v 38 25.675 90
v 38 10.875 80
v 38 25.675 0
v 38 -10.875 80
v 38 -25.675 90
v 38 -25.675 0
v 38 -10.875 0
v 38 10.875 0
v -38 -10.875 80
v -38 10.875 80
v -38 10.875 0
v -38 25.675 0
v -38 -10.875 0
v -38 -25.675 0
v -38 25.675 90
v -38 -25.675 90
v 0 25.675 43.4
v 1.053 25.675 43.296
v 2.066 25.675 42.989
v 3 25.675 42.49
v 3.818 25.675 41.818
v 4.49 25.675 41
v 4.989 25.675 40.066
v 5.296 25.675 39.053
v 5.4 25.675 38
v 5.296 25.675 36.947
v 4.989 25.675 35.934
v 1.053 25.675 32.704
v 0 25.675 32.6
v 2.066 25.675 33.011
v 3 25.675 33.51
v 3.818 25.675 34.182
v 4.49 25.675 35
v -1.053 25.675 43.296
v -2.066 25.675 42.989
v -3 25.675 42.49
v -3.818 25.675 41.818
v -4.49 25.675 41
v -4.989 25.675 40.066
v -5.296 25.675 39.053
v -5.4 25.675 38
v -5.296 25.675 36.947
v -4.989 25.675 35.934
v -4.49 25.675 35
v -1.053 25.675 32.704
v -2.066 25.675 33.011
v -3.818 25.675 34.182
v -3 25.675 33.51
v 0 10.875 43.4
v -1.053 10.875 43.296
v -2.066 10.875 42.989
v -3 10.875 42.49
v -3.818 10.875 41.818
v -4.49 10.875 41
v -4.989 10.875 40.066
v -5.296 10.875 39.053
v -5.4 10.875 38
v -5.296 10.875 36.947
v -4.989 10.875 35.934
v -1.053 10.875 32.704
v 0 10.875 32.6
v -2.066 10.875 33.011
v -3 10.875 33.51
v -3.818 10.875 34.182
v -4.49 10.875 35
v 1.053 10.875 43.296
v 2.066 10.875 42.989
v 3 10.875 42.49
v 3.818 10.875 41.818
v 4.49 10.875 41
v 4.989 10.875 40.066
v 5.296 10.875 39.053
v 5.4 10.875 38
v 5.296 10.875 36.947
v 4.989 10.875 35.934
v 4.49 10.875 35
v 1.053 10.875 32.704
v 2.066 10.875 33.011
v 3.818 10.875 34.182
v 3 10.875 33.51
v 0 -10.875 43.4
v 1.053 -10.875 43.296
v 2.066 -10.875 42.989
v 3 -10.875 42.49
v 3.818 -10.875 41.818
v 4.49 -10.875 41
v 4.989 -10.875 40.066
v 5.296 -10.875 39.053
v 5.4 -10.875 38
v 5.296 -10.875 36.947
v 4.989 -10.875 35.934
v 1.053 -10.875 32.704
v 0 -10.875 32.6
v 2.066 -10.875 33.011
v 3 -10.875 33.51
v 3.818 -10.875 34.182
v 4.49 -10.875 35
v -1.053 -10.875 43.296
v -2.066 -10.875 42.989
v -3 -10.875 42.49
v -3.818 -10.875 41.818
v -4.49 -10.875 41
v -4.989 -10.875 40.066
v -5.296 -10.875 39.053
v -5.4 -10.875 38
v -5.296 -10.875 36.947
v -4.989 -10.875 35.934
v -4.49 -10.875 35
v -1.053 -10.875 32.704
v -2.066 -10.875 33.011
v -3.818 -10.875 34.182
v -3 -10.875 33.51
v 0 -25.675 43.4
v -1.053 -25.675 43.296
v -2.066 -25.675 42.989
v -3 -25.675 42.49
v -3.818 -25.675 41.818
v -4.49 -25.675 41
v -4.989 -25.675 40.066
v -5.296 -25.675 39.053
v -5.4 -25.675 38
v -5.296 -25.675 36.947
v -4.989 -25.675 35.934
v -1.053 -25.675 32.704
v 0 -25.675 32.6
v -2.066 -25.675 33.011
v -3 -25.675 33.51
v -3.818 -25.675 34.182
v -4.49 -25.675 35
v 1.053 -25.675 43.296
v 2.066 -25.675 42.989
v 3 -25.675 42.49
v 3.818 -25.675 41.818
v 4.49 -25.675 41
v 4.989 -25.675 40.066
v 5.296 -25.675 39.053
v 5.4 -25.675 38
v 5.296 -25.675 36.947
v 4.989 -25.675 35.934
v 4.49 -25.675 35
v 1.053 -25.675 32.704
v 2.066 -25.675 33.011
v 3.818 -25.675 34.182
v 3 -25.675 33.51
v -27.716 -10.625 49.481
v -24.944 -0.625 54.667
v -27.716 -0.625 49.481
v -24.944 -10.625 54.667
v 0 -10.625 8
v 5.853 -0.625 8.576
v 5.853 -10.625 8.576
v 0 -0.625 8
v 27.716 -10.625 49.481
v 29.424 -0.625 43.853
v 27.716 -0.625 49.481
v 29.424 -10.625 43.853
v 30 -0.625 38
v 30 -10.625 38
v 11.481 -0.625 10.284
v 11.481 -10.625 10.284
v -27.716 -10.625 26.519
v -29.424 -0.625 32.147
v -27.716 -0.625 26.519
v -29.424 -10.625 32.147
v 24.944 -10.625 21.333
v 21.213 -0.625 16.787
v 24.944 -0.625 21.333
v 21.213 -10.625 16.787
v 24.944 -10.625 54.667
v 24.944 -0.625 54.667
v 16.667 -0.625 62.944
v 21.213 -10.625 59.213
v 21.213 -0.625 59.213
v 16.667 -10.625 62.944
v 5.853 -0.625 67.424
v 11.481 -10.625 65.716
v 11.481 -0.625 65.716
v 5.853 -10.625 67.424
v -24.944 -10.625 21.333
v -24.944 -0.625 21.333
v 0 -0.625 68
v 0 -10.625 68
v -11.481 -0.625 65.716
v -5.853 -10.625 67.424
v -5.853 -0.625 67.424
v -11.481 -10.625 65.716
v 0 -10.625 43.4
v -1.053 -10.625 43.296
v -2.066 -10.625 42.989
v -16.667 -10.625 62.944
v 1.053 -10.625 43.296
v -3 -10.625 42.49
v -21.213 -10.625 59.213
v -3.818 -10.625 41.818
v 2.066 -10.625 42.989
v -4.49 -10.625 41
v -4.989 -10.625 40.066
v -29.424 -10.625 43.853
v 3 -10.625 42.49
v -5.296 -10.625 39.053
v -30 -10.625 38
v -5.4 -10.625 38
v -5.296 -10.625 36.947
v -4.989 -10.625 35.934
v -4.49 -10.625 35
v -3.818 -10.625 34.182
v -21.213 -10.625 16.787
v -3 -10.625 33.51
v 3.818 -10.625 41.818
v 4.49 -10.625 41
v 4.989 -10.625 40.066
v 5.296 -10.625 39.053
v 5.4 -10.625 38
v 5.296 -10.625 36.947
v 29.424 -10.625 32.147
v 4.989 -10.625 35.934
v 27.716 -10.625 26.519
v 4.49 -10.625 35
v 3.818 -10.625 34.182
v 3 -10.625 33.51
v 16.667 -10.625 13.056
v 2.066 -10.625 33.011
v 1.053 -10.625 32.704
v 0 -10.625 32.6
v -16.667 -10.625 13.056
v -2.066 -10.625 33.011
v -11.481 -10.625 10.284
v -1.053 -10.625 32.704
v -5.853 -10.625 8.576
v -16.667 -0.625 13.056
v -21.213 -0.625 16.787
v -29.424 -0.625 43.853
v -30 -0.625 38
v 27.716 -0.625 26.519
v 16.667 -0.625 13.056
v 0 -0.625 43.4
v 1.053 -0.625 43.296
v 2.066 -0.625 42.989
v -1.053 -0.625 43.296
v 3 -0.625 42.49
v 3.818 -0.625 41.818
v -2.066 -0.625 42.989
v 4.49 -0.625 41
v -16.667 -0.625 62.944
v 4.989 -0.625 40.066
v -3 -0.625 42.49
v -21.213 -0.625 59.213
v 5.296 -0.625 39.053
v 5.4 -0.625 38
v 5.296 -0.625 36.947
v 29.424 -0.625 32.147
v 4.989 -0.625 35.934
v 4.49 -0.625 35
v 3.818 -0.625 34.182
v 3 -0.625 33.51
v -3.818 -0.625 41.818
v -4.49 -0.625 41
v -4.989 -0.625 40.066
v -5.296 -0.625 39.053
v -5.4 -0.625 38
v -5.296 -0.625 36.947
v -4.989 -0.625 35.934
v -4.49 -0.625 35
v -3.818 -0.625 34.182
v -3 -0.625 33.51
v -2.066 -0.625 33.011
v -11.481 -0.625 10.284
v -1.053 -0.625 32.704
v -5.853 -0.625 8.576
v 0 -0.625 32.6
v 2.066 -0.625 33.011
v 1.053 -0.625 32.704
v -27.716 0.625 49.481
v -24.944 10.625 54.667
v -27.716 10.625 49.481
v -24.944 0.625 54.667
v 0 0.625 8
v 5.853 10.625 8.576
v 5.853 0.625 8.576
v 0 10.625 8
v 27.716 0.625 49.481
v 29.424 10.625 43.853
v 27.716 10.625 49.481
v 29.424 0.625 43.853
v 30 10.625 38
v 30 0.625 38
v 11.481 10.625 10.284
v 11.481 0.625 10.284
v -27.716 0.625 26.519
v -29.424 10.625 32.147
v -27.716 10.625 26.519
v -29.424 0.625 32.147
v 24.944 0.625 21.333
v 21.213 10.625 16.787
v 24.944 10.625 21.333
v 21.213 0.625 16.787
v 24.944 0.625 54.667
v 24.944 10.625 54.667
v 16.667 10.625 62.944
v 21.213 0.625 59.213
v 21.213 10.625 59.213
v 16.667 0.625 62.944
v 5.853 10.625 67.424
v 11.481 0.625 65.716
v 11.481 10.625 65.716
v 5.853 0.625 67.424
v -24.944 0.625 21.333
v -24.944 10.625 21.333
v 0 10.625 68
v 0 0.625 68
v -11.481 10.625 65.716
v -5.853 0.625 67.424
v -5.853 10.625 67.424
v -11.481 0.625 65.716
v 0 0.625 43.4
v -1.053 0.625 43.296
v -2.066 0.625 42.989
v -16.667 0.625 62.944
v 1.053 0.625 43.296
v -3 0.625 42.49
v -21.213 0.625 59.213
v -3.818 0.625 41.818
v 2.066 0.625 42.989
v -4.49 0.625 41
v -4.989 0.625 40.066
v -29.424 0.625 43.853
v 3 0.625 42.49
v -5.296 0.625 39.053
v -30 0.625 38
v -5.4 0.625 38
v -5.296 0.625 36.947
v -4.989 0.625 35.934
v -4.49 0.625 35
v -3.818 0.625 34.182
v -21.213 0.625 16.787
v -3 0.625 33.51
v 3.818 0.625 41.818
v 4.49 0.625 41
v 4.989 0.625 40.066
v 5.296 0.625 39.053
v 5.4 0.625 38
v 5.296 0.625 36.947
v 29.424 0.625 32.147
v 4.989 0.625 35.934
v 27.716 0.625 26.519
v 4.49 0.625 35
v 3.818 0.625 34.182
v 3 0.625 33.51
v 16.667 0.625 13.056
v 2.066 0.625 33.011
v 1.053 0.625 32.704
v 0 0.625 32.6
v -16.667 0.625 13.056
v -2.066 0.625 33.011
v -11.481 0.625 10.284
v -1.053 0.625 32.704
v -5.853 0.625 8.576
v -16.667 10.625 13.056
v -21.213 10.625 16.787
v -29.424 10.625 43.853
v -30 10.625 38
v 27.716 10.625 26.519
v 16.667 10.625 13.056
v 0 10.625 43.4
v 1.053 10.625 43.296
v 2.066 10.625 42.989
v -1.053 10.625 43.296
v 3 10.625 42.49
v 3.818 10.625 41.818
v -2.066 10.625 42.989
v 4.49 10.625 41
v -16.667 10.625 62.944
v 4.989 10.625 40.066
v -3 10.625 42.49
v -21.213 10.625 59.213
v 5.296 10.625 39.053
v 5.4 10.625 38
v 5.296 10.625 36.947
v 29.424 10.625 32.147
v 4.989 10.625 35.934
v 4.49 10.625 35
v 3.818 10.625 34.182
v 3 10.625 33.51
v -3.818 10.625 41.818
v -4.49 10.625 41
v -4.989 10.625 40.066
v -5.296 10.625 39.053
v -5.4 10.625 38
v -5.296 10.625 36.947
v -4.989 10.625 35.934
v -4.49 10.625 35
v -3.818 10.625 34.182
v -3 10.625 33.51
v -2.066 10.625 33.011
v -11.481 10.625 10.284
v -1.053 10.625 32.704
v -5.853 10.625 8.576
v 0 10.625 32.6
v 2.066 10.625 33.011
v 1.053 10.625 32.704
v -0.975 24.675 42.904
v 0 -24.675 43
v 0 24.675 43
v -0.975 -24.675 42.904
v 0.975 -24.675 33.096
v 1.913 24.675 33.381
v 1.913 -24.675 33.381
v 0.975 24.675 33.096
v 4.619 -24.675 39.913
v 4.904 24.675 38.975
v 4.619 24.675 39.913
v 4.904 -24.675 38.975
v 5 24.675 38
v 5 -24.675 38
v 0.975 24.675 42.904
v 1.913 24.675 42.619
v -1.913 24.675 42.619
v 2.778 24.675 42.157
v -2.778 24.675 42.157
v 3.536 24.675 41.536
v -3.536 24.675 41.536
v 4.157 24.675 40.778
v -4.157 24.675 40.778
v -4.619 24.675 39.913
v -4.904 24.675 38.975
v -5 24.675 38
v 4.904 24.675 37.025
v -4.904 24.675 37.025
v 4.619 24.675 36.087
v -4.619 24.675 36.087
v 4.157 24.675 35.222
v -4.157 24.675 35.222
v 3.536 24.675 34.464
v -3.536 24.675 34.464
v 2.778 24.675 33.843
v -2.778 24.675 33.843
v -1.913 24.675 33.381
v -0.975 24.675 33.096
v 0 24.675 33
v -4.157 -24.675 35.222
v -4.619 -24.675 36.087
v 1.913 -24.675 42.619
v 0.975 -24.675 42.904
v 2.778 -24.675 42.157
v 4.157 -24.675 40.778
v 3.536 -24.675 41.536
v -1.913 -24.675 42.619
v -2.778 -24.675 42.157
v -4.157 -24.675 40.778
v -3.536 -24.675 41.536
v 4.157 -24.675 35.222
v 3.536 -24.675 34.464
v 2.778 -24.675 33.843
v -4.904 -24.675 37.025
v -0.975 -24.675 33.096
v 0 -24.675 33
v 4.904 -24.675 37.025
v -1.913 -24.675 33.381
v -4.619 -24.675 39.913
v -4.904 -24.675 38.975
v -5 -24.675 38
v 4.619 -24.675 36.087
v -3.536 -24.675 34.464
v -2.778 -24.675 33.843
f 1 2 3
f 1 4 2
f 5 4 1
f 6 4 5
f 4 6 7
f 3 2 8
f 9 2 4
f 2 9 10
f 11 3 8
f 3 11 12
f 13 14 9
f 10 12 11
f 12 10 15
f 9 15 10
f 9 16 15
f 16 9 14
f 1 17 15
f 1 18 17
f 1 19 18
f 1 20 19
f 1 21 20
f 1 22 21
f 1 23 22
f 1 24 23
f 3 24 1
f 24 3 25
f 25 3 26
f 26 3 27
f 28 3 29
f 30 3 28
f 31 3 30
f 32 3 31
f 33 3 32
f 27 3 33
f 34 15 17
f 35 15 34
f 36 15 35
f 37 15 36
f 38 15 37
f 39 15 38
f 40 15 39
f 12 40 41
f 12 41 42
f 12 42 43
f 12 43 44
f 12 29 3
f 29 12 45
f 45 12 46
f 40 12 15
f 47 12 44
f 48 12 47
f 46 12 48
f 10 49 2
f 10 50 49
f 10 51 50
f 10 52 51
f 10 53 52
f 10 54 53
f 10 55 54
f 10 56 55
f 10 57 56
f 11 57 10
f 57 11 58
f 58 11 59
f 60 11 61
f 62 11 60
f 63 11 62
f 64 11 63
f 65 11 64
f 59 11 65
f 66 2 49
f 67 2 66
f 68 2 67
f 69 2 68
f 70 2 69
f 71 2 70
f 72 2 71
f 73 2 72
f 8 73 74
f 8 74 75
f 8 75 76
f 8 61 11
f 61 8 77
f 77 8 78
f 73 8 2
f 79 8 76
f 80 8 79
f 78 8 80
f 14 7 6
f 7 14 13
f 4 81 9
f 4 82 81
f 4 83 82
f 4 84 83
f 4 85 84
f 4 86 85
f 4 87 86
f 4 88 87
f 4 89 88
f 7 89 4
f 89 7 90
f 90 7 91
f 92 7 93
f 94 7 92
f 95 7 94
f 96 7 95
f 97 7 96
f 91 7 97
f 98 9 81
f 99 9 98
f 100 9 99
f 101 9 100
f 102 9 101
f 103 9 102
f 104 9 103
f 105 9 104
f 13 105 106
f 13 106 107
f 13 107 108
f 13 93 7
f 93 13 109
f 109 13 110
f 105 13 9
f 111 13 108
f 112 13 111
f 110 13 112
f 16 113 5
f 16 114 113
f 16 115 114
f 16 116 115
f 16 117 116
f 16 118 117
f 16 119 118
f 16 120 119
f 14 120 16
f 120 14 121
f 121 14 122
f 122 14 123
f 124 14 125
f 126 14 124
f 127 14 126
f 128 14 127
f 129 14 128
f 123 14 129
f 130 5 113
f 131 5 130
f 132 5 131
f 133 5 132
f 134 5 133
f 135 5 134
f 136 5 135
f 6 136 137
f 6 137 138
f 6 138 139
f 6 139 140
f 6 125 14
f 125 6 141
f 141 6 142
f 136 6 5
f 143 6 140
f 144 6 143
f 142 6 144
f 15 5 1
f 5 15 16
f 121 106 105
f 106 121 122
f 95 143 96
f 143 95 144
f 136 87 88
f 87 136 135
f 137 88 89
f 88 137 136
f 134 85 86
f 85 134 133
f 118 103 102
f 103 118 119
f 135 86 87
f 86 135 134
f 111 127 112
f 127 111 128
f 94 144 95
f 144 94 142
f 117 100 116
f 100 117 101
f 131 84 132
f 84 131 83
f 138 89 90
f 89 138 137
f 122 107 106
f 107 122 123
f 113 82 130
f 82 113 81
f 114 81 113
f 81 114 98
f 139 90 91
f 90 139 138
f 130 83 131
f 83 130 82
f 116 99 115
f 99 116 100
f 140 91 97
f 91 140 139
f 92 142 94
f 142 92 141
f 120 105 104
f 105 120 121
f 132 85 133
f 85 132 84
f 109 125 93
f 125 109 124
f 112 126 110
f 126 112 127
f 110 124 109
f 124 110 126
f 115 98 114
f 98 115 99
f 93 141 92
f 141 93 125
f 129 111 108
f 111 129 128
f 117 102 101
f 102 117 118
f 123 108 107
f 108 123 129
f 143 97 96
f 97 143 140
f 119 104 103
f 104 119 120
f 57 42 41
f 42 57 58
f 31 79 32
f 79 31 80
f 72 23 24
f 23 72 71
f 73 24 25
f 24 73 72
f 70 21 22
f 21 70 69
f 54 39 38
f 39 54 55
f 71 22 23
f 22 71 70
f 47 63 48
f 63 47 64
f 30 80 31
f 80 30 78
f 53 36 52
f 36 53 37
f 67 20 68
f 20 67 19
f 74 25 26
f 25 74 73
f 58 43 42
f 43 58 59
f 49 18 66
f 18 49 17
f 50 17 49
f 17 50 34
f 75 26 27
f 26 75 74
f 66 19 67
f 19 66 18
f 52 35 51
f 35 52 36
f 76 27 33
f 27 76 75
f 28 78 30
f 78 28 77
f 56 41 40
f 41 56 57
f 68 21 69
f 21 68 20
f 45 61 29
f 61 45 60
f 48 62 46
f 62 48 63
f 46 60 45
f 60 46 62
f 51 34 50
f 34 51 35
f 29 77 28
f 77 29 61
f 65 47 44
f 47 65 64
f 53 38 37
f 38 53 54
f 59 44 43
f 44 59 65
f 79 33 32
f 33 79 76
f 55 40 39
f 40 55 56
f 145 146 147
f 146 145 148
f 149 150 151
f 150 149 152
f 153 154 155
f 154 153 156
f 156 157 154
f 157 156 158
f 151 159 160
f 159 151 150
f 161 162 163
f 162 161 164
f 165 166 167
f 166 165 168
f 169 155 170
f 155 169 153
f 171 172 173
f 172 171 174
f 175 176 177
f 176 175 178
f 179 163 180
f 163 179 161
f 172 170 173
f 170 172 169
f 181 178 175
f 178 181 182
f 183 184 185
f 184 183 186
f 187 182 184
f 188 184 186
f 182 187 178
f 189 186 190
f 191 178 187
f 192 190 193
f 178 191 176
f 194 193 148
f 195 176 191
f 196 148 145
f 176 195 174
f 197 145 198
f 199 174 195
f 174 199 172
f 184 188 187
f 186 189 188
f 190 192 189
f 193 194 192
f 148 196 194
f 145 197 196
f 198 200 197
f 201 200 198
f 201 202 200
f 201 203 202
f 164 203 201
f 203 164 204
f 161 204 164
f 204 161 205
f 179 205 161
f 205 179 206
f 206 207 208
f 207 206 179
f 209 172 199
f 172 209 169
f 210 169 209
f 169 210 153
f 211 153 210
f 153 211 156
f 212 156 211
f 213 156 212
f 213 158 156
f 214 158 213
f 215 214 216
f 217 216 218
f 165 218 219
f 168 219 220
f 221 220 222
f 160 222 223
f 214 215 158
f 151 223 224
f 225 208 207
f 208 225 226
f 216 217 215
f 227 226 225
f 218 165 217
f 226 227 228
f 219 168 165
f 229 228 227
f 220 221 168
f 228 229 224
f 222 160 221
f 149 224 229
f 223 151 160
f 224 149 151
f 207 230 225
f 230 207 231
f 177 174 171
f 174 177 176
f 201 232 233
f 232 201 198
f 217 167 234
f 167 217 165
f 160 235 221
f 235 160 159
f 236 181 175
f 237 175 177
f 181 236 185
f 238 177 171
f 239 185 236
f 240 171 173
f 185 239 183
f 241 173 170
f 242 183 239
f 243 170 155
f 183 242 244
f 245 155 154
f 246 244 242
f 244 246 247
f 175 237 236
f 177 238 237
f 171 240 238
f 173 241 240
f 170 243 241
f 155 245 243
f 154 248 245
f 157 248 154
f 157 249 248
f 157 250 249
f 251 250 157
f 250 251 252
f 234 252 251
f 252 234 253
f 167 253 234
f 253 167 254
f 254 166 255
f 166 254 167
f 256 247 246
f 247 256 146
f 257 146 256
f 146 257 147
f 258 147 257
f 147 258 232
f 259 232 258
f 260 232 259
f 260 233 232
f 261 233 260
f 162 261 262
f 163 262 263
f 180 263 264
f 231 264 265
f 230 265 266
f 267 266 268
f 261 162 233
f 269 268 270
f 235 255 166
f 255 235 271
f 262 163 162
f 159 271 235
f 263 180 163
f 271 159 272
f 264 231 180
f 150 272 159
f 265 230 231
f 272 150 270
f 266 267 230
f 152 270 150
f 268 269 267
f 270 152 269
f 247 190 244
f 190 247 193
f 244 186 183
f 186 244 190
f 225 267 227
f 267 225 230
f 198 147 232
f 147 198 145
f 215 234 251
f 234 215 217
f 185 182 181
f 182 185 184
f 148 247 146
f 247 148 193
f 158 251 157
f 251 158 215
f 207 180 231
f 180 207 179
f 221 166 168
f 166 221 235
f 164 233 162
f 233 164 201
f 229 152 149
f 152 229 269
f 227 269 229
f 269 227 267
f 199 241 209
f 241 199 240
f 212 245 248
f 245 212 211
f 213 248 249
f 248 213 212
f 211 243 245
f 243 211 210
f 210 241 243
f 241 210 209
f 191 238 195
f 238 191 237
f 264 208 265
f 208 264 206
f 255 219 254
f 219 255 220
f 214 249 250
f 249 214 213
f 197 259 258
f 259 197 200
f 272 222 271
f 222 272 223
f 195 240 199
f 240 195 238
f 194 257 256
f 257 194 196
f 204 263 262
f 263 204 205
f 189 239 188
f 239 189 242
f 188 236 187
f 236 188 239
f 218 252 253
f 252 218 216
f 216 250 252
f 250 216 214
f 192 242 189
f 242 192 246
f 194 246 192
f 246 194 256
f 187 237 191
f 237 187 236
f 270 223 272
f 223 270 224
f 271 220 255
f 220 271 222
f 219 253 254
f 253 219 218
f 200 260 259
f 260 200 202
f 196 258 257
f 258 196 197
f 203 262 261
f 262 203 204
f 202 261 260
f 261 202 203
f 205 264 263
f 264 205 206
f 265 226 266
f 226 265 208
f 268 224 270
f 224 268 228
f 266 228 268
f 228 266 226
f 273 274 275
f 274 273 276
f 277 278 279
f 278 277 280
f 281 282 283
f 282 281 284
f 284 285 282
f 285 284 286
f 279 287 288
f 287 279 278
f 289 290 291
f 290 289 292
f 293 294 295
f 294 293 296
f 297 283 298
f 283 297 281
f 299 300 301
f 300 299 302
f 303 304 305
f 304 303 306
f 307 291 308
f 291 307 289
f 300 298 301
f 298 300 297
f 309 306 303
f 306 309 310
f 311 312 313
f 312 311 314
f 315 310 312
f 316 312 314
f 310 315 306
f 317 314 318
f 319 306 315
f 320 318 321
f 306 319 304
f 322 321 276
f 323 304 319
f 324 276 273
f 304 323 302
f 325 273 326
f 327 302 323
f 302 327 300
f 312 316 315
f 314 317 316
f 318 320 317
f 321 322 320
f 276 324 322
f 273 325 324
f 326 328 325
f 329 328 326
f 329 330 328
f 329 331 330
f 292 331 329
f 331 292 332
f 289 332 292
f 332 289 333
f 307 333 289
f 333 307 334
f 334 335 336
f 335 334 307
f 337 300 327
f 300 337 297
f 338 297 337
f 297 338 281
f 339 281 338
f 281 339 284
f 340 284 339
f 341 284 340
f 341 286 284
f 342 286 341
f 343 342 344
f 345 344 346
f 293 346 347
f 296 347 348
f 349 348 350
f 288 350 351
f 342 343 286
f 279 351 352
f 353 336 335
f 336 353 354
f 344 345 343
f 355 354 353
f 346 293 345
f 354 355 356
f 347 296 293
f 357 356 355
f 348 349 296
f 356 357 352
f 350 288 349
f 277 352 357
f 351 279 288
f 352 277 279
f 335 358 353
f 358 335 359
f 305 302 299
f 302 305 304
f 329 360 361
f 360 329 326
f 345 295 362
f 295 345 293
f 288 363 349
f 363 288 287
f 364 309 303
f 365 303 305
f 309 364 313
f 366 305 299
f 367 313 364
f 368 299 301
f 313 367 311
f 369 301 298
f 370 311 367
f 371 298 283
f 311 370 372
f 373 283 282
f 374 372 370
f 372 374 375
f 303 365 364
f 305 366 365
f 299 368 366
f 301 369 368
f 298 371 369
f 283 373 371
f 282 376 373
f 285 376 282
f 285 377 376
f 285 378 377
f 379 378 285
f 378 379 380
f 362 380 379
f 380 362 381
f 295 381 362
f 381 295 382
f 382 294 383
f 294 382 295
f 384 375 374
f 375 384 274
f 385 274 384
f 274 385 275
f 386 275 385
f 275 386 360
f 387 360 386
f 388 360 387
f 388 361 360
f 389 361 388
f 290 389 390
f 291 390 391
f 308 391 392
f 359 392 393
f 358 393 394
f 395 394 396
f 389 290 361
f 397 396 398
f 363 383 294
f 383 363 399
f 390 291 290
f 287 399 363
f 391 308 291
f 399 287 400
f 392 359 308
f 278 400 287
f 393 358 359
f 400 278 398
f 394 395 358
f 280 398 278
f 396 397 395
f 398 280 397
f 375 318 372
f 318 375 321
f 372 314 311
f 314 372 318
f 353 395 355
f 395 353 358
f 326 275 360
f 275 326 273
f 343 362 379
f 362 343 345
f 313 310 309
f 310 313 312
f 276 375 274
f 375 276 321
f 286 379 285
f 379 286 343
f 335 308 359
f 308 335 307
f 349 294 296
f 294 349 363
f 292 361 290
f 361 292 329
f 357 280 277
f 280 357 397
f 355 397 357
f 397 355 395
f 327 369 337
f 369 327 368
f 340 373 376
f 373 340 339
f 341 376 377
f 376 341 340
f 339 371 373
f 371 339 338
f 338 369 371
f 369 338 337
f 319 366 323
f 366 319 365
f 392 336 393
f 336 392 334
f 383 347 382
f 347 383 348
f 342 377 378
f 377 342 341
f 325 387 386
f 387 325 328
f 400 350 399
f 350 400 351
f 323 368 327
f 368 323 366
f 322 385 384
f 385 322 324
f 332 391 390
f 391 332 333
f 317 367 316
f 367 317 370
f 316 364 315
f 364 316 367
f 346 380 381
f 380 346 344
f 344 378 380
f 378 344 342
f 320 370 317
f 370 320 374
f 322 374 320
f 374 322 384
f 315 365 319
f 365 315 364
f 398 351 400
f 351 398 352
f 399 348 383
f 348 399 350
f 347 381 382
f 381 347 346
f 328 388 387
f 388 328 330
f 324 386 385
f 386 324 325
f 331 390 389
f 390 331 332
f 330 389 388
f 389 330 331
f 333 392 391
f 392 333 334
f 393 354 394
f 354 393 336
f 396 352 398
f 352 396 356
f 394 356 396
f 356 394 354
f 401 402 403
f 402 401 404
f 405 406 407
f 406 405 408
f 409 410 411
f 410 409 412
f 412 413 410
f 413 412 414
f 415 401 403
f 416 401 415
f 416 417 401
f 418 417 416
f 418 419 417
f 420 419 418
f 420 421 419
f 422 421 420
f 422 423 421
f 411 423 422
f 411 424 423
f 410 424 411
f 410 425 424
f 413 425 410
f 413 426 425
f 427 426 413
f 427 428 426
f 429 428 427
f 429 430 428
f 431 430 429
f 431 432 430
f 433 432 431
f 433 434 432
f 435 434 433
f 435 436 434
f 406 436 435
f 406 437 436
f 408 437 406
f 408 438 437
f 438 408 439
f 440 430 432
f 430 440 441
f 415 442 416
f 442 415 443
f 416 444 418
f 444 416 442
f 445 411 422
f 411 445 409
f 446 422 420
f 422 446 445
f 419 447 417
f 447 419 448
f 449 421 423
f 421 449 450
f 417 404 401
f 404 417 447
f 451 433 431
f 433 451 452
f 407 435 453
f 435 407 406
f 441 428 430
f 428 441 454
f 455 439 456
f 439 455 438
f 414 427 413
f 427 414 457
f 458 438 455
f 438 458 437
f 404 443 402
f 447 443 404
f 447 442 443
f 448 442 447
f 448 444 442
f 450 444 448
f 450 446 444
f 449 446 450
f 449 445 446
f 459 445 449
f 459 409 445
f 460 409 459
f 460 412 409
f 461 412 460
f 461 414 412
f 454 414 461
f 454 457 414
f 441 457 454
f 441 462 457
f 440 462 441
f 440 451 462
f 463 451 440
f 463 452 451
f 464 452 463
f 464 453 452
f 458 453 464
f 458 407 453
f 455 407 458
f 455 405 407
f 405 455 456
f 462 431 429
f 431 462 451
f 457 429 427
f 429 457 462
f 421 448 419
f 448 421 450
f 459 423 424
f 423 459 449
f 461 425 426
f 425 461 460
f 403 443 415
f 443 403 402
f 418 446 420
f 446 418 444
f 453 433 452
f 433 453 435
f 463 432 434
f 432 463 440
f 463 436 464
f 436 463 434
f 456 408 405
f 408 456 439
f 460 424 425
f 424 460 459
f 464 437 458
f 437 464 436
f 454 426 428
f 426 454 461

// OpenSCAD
$fn = 32;

// ------------------------------------------------------------------------
// Trolley wheel set: wheels d60, fork 80 mm tall
// Every part is its own module, assembly() places every instance.
// ------------------------------------------------------------------------

// --- part 1 ---
module trolley_fork() {
  difference() {
    union() {
      translate([-38, 10.875, 0]) cube([76, 14.8, 80]);
      translate([-38, -25.675, 0]) cube([76, 14.8, 80]);
      translate([-38, -25.675, 80]) cube([76, 51.35, 10]);
    }
    translate([0, -18.275, 38]) rotate([90, 0, 0]) cylinder(h = 16.8, d = 10.8, center = true);
    translate([0, 18.275, 38]) rotate([90, 0, 0]) cylinder(h = 16.8, d = 10.8, center = true);
  }
}

// --- part 2 ---
module trolley_wheel() {
  difference() {
      translate([0, 0, 0]) cylinder(h = 10, d = 60);
      translate([0, 0, -1]) cylinder(h = 12, d = 10.8);
    }
}

// --- part 3 ---
module trolley_axle() {
  translate([0, 0, -24.675]) cylinder(h = 49.35, d = 10);
}

// --- assembly ---
module assembly() {
  color([0.80, 0.24, 0.20]) translate([0, 0, 0]) rotate([0, 0, 0]) trolley_fork();
  color([0.20, 0.45, 0.75]) translate([0, -0.625, 38]) rotate([90, 0, 0]) trolley_wheel();
  color([0.25, 0.62, 0.32]) translate([0, 10.625, 38]) rotate([90, 0, 0]) trolley_wheel();
  color([0.92, 0.70, 0.18]) translate([0, 0, 38]) rotate([90, 0, 0]) trolley_axle();
}

assembly();
